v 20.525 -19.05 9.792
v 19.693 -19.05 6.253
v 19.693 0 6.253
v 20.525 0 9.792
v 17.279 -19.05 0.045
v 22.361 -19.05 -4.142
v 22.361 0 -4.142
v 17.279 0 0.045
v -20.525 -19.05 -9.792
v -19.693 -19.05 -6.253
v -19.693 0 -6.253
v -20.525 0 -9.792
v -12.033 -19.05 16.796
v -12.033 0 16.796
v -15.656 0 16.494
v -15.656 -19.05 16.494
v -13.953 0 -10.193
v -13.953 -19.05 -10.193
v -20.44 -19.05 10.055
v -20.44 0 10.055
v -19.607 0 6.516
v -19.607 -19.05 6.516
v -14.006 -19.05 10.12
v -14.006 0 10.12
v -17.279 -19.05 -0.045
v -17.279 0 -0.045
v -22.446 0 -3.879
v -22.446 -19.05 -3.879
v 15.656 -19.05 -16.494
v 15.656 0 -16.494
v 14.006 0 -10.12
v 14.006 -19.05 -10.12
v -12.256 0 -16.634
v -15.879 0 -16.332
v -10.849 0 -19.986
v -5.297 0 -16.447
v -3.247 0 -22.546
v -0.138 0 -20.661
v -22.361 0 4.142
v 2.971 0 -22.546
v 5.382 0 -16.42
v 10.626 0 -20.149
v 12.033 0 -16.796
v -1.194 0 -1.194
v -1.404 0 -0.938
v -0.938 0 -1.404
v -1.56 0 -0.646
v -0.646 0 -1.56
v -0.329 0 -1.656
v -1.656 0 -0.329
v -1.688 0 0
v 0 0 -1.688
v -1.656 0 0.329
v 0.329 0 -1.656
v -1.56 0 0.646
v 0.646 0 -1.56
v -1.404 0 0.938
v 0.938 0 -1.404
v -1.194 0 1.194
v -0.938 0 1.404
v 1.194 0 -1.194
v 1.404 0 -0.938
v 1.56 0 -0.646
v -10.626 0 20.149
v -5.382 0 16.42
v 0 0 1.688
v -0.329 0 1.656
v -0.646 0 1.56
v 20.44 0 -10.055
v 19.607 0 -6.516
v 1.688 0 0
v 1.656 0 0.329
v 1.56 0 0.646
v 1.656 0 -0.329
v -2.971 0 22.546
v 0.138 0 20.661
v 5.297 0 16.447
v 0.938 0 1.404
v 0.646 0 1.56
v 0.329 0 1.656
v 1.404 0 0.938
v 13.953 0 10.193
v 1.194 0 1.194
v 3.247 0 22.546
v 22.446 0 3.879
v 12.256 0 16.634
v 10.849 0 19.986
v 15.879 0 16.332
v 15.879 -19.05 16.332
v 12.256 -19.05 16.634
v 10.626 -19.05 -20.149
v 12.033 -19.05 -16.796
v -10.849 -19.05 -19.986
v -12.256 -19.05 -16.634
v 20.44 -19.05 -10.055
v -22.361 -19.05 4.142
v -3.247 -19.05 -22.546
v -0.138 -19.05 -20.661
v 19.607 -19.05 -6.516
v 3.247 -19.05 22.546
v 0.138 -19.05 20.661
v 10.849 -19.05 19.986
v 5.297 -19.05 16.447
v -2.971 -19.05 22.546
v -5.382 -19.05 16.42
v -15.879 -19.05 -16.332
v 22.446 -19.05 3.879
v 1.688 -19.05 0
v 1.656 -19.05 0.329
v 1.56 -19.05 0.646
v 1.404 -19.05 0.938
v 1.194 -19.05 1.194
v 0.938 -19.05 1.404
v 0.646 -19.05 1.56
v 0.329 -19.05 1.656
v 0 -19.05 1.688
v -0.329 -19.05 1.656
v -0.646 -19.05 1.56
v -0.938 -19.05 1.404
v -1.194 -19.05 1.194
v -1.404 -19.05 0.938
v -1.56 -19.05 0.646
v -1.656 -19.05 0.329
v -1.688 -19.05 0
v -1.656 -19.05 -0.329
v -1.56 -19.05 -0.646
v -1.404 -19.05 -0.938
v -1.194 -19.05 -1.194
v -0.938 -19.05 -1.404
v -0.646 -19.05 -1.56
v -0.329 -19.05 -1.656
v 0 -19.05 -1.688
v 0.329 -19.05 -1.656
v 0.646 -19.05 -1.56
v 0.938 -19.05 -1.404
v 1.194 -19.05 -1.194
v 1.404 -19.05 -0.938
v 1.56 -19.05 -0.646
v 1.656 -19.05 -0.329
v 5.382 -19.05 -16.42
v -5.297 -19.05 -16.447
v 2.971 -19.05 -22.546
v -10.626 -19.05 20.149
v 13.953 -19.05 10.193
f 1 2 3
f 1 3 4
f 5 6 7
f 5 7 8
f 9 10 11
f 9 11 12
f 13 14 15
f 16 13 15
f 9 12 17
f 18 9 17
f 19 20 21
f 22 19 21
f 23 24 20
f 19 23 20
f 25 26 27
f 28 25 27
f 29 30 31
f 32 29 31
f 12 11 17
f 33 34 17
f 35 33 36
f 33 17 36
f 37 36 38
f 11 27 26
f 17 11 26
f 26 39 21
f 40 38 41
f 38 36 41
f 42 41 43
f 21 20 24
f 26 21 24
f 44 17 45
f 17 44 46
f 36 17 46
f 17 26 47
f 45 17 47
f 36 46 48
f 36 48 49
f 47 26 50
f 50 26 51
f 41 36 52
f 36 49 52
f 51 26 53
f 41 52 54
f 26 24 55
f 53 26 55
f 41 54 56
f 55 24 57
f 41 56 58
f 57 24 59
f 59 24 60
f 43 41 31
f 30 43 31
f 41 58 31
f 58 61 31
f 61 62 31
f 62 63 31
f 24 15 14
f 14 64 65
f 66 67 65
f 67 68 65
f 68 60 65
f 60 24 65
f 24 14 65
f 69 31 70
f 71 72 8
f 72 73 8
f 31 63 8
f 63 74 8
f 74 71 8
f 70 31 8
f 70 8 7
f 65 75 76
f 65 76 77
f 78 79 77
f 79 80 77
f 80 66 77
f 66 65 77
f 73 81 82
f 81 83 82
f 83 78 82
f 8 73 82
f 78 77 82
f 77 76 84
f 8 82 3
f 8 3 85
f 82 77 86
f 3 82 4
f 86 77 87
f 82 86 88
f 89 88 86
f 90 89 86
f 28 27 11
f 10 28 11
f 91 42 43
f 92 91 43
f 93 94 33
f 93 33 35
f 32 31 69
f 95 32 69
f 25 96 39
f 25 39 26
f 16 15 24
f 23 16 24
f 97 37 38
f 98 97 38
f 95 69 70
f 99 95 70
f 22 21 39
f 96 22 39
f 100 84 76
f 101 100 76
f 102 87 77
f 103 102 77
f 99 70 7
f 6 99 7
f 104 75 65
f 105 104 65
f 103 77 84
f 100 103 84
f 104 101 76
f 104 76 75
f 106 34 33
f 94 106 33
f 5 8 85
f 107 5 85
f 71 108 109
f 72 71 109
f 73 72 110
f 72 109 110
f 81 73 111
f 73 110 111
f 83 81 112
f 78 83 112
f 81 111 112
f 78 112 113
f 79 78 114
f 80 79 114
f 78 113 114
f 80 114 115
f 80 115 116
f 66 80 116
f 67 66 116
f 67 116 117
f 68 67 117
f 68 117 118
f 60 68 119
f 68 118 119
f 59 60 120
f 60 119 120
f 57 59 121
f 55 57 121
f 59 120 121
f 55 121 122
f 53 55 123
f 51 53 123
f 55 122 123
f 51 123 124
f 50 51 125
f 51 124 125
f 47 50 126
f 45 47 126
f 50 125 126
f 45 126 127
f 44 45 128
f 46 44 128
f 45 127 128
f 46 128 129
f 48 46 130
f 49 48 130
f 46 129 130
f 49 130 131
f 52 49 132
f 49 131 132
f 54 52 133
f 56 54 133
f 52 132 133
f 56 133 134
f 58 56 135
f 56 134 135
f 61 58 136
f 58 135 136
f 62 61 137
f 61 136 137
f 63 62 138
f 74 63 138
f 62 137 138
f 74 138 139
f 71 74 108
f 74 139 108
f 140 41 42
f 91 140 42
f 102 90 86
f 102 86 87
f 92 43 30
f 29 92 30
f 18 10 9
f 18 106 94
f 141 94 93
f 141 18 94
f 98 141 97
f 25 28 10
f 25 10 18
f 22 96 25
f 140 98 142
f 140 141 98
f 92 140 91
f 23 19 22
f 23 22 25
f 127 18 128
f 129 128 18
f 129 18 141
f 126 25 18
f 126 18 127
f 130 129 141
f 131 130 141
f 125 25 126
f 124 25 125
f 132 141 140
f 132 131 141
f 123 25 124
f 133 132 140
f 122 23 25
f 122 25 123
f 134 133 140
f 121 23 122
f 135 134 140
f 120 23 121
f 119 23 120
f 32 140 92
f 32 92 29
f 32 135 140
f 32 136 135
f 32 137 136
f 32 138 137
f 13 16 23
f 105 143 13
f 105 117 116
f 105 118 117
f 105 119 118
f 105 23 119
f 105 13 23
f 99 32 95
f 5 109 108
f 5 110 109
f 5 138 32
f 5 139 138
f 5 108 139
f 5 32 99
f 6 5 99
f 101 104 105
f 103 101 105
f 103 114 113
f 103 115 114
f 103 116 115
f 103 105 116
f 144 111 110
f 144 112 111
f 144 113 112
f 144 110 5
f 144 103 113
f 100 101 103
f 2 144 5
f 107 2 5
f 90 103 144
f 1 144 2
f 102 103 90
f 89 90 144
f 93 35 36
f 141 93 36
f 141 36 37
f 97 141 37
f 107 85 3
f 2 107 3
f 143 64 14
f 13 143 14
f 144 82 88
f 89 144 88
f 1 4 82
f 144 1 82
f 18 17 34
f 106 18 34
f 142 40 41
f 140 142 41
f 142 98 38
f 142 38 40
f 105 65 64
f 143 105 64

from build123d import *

# Parameters (mm, degrees)
F1_DEPTH = 19.05
F2_R     = 1.6880243077
F3_DEPTH = 19.05
F4_DEPTH = 19.05


with BuildPart() as f1:
    # F0 (on Front) → F1 (new body)
    with BuildSketch(Plane.XZ):
        with BuildLine():
            ThreePointArc((15.778162915, -1.0689673082), (15.8052876039, -0.5347895271), (15.8143326157, 0))
            ThreePointArc((15.8143326157, 0), (15.8010341981, 0.6484090916), (15.7611613108, 1.2957276769))
            ThreePointArc((15.7611613108, 1.2957276769), (15.0048006195, 4.9949048489), (13.3931251572, 8.4093587509))
            ThreePointArc((13.3931251572, 8.4093587509), (12.7269029213, 9.3871751934), (11.9894377321, 10.3124438882))
            ThreePointArc((11.9894377321, 10.3124438882), (9.2032072916, 12.8605634257), (5.8923688049, 14.6755955908))
            ThreePointArc((5.8923688049, 14.6755955908), (4.7786376097, 15.0750701051), (3.6381564457, 15.3901570413))
            ThreePointArc((3.6381564457, 15.3901570413), (-0.1136984162, 15.8139238884), (-3.8590721566, 15.3362537202))
            ThreePointArc((-3.8590721566, 15.3362537202), (-4.9949048489, 15.0048006195), (-6.1027769466, 14.5893532968))
            ThreePointArc((-6.1027769466, 14.5893532968), (-9.3871751934, 12.7269029213), (-12.1364787193, 10.1389841885))
            ThreePointArc((-12.1364787193, 10.1389841885), (-12.8605634257, 9.2032072916), (-13.512656971, 8.2159124668))
            ThreePointArc((-13.512656971, 8.2159124668), (-15.0750701051, 4.7786376097), (-15.778162915, 1.0689673082))
            ThreePointArc((-15.778162915, 1.0689673082), (-15.8139238884, -0.1136984162), (-15.7611613108, -1.2957276769))
            ThreePointArc((-15.7611613108, -1.2957276769), (-15.0048006195, -4.9949048489), (-13.3931251572, -8.4093587509))
            ThreePointArc((-13.3931251572, -8.4093587509), (-12.7269029213, -9.3871751934), (-11.9894377321, -10.3124438882))
            ThreePointArc((-11.9894377321, -10.3124438882), (-9.2032072916, -12.8605634257), (-5.8923688049, -14.6755955908))
            ThreePointArc((-5.8923688049, -14.6755955908), (-4.7786376097, -15.0750701051), (-3.6381564457, -15.3901570413))
            ThreePointArc((-3.6381564457, -15.3901570413), (0.1136984162, -15.8139238884), (3.8590721566, -15.3362537202))
            ThreePointArc((3.8590721566, -15.3362537202), (4.9949048489, -15.0048006195), (6.1027769466, -14.5893532968))
            ThreePointArc((6.1027769466, -14.5893532968), (9.3871751934, -12.7269029213), (12.1364787193, -10.1389841885))
            ThreePointArc((12.1364787193, -10.1389841885), (12.8605634257, -9.2032072916), (13.512656971, -8.2159124668))
            ThreePointArc((13.512656971, -8.2159124668), (15.0750701051, -4.7786376097), (15.778162915, -1.0689673082))
        make_face()
    extrude(amount=F1_DEPTH)

    # F2 (on face) → F3 (cut)
    with BuildSketch(Plane.XZ.offset(19.05)):
        Circle(F2_R)
    extrude(amount=-F3_DEPTH, mode=Mode.SUBTRACT)

    # F0 (on Front) → F4 (join)
    with BuildSketch(Plane.XZ):
        with BuildLine():
            ThreePointArc((15.7611613108, 1.2957276769), (15.8010341981, 0.6484090916), (15.8143326157, 0))
            ThreePointArc((15.8143326157, 0), (15.8052876039, -0.5347895271), (15.778162915, -1.0689673082))
            Line((15.778162915, -1.0689673082), (17.2791990232, 0.0449688409))
            Line((17.2791990232, 0.0449688409), (15.7611613108, 1.2957276769))
        make_face()
        with BuildLine():
            ThreePointArc((13.3931251572, 8.4093587509), (15.0048006195, 4.9949048489), (15.7611613108, 1.2957276769))
            Line((15.7611613108, 1.2957276769), (17.2791990232, 0.0449688409))
            Line((17.2791990232, 0.0449688409), (22.4461490806, 3.8794218687))
            Line((22.4461490806, 3.8794218687), (19.6925609503, 6.2533739679))
            Line((19.6925609503, 6.2533739679), (20.5248865096, 9.7924600538))
            Line((20.5248865096, 9.7924600538), (13.9527336374, 10.1928389138))
            Line((13.9527336374, 10.1928389138), (13.3931251572, 8.4093587509))
        make_face()
        with BuildLine():
            Line((17.2791990232, 0.0449688409), (15.778162915, -1.0689673082))
            ThreePointArc((15.778162915, -1.0689673082), (15.0750701051, -4.7786376097), (13.512656971, -8.2159124668))
            Line((13.512656971, -8.2159124668), (14.0055976804, -10.1200778007))
            Line((14.0055976804, -10.1200778007), (20.4395830263, -10.0549971802))
            Line((20.4395830263, -10.0549971802), (19.6072574669, -6.5159110943))
            Line((19.6072574669, -6.5159110943), (22.3608455972, -4.1419589951))
            Line((22.3608455972, -4.1419589951), (17.2791990232, 0.0449688409))
        make_face()
        with BuildLine():
            ThreePointArc((11.9894377321, 10.3124438882), (12.7269029213, 9.3871751934), (13.3931251572, 8.4093587509))
            Line((13.3931251572, 8.4093587509), (13.9527336374, 10.1928389138))
            Line((13.9527336374, 10.1928389138), (11.9894377321, 10.3124438882))
        make_face()
        with BuildLine():
            Line((14.0055976804, -10.1200778007), (13.512656971, -8.2159124668))
            ThreePointArc((13.512656971, -8.2159124668), (12.8605634257, -9.2032072916), (12.1364787193, -10.1389841885))
            Line((12.1364787193, -10.1389841885), (14.0055976804, -10.1200778007))
        make_face()
        with BuildLine():
            ThreePointArc((5.8923688049, 14.6755955908), (9.2032072916, 12.8605634257), (11.9894377321, 10.3124438882))
            Line((11.9894377321, 10.3124438882), (13.9527336374, 10.1928389138))
            Line((13.9527336374, 10.1928389138), (15.8790491026, 16.3320336204))
            Line((15.8790491026, 16.3320336204), (12.2559754761, 16.6340827186))
            Line((12.2559754761, 16.6340827186), (10.8491183906, 19.9864921956))
            Line((10.8491183906, 19.9864921956), (5.2967982382, 16.4473909634))
            Line((5.2967982382, 16.4473909634), (5.8923688049, 14.6755955908))
        make_face()
        with BuildLine():
            Line((14.0055976804, -10.1200778007), (12.1364787193, -10.1389841885))
            ThreePointArc((12.1364787193, -10.1389841885), (9.3871751934, -12.7269029213), (6.1027769466, -14.5893532968))
            Line((6.1027769466, -14.5893532968), (5.3823340565, -16.4195986913))
            Line((5.3823340565, -16.4195986913), (10.6257909718, -20.148749063))
            Line((10.6257909718, -20.148749063), (12.0326480574, -16.796339586))
            Line((12.0326480574, -16.796339586), (15.6557216838, -16.4942904878))
            Line((15.6557216838, -16.4942904878), (14.0055976804, -10.1200778007))
        make_face()
        with BuildLine():
            ThreePointArc((3.6381564457, 15.3901570413), (4.7786376097, 15.0750701051), (5.8923688049, 14.6755955908))
            Line((5.8923688049, 14.6755955908), (5.2967982382, 16.4473909634))
            Line((5.2967982382, 16.4473909634), (3.6381564457, 15.3901570413))
        make_face()
        with BuildLine():
            Line((5.3823340565, -16.4195986913), (6.1027769466, -14.5893532968))
            ThreePointArc((6.1027769466, -14.5893532968), (4.9949048489, -15.0048006195), (3.8590721566, -15.3362537202))
            Line((3.8590721566, -15.3362537202), (5.3823340565, -16.4195986913))
        make_face()
        with BuildLine():
            ThreePointArc((-3.8590721566, 15.3362537202), (-0.1136984162, 15.8139238884), (3.6381564457, 15.3901570413))
            Line((3.6381564457, 15.3901570413), (5.2967982382, 16.4473909634))
            Line((5.2967982382, 16.4473909634), (3.2466920765, 22.5463636346))
            Line((3.2466920765, 22.5463636346), (0.1380239354, 20.6611372425))
            Line((0.1380239354, 20.6611372425), (-2.9706442056, 22.5463636346))
            Line((-2.9706442056, 22.5463636346), (-5.3823340565, 16.4195986913))
            Line((-5.3823340565, 16.4195986913), (-3.8590721566, 15.3362537202))
        make_face()
        with BuildLine():
            Line((5.3823340565, -16.4195986913), (3.8590721566, -15.3362537202))
            ThreePointArc((3.8590721566, -15.3362537202), (0.1136984162, -15.8139238884), (-3.6381564457, -15.3901570413))
            Line((-3.6381564457, -15.3901570413), (-5.2967982382, -16.4473909634))
            Line((-5.2967982382, -16.4473909634), (-3.2466920765, -22.5463636346))
            Line((-3.2466920765, -22.5463636346), (-0.1380239354, -20.6611372425))
            Line((-0.1380239354, -20.6611372425), (2.9706442056, -22.5463636346))
            Line((2.9706442056, -22.5463636346), (5.3823340565, -16.4195986913))
        make_face()
        with BuildLine():
            ThreePointArc((-6.1027769466, 14.5893532968), (-4.9949048489, 15.0048006195), (-3.8590721566, 15.3362537202))
            Line((-3.8590721566, 15.3362537202), (-5.3823340565, 16.4195986913))
            Line((-5.3823340565, 16.4195986913), (-6.1027769466, 14.5893532968))
        make_face()
        with BuildLine():
            Line((-5.2967982382, -16.4473909634), (-3.6381564457, -15.3901570413))
            ThreePointArc((-3.6381564457, -15.3901570413), (-4.7786376097, -15.0750701051), (-5.8923688049, -14.6755955908))
            Line((-5.8923688049, -14.6755955908), (-5.2967982382, -16.4473909634))
        make_face()
        with BuildLine():
            ThreePointArc((-12.1364787193, 10.1389841885), (-9.3871751934, 12.7269029213), (-6.1027769466, 14.5893532968))
            Line((-6.1027769466, 14.5893532968), (-5.3823340565, 16.4195986913))
            Line((-5.3823340565, 16.4195986913), (-10.6257909718, 20.148749063))
            Line((-10.6257909718, 20.148749063), (-12.0326480574, 16.796339586))
            Line((-12.0326480574, 16.796339586), (-15.6557216838, 16.4942904878))
            Line((-15.6557216838, 16.4942904878), (-14.0055976804, 10.1200778007))
            Line((-14.0055976804, 10.1200778007), (-12.1364787193, 10.1389841885))
        make_face()
        with BuildLine():
            Line((-5.2967982382, -16.4473909634), (-5.8923688049, -14.6755955908))
            ThreePointArc((-5.8923688049, -14.6755955908), (-9.2032072916, -12.8605634257), (-11.9894377321, -10.3124438882))
            Line((-11.9894377321, -10.3124438882), (-13.9527336374, -10.1928389138))
            Line((-13.9527336374, -10.1928389138), (-15.8790491026, -16.3320336204))
            Line((-15.8790491026, -16.3320336204), (-12.2559754761, -16.6340827186))
            Line((-12.2559754761, -16.6340827186), (-10.8491183906, -19.9864921956))
            Line((-10.8491183906, -19.9864921956), (-5.2967982382, -16.4473909634))
        make_face()
        with BuildLine():
            ThreePointArc((-13.512656971, 8.2159124668), (-12.8605634257, 9.2032072916), (-12.1364787193, 10.1389841885))
            Line((-12.1364787193, 10.1389841885), (-14.0055976804, 10.1200778007))
            Line((-14.0055976804, 10.1200778007), (-13.512656971, 8.2159124668))
        make_face()
        with BuildLine():
            Line((-13.9527336374, -10.1928389138), (-11.9894377321, -10.3124438882))
            ThreePointArc((-11.9894377321, -10.3124438882), (-12.7269029213, -9.3871751934), (-13.3931251572, -8.4093587509))
            Line((-13.3931251572, -8.4093587509), (-13.9527336374, -10.1928389138))
        make_face()
        with BuildLine():
            ThreePointArc((-15.778162915, 1.0689673082), (-15.0750701051, 4.7786376097), (-13.512656971, 8.2159124668))
            Line((-13.512656971, 8.2159124668), (-14.0055976804, 10.1200778007))
            Line((-14.0055976804, 10.1200778007), (-20.4395830263, 10.0549971802))
            Line((-20.4395830263, 10.0549971802), (-19.6072574669, 6.5159110943))
            Line((-19.6072574669, 6.5159110943), (-22.3608455972, 4.1419589951))
            Line((-22.3608455972, 4.1419589951), (-17.2791990232, -0.0449688409))
            Line((-17.2791990232, -0.0449688409), (-15.778162915, 1.0689673082))
        make_face()
        with BuildLine():
            Line((-13.9527336374, -10.1928389138), (-13.3931251572, -8.4093587509))
            ThreePointArc((-13.3931251572, -8.4093587509), (-15.0048006195, -4.9949048489), (-15.7611613108, -1.2957276769))
            Line((-15.7611613108, -1.2957276769), (-17.2791990232, -0.0449688409))
            Line((-17.2791990232, -0.0449688409), (-22.4461490806, -3.8794218687))
            Line((-22.4461490806, -3.8794218687), (-19.6925609503, -6.2533739679))
            Line((-19.6925609503, -6.2533739679), (-20.5248865096, -9.7924600538))
            Line((-20.5248865096, -9.7924600538), (-13.9527336374, -10.1928389138))
        make_face()
        with BuildLine():
            ThreePointArc((-15.7611613108, -1.2957276769), (-15.8139238884, -0.1136984162), (-15.778162915, 1.0689673082))
            Line((-15.778162915, 1.0689673082), (-17.2791990232, -0.0449688409))
            Line((-17.2791990232, -0.0449688409), (-15.7611613108, -1.2957276769))
        make_face()
    extrude(amount=F4_DEPTH)


solid = f1.part
